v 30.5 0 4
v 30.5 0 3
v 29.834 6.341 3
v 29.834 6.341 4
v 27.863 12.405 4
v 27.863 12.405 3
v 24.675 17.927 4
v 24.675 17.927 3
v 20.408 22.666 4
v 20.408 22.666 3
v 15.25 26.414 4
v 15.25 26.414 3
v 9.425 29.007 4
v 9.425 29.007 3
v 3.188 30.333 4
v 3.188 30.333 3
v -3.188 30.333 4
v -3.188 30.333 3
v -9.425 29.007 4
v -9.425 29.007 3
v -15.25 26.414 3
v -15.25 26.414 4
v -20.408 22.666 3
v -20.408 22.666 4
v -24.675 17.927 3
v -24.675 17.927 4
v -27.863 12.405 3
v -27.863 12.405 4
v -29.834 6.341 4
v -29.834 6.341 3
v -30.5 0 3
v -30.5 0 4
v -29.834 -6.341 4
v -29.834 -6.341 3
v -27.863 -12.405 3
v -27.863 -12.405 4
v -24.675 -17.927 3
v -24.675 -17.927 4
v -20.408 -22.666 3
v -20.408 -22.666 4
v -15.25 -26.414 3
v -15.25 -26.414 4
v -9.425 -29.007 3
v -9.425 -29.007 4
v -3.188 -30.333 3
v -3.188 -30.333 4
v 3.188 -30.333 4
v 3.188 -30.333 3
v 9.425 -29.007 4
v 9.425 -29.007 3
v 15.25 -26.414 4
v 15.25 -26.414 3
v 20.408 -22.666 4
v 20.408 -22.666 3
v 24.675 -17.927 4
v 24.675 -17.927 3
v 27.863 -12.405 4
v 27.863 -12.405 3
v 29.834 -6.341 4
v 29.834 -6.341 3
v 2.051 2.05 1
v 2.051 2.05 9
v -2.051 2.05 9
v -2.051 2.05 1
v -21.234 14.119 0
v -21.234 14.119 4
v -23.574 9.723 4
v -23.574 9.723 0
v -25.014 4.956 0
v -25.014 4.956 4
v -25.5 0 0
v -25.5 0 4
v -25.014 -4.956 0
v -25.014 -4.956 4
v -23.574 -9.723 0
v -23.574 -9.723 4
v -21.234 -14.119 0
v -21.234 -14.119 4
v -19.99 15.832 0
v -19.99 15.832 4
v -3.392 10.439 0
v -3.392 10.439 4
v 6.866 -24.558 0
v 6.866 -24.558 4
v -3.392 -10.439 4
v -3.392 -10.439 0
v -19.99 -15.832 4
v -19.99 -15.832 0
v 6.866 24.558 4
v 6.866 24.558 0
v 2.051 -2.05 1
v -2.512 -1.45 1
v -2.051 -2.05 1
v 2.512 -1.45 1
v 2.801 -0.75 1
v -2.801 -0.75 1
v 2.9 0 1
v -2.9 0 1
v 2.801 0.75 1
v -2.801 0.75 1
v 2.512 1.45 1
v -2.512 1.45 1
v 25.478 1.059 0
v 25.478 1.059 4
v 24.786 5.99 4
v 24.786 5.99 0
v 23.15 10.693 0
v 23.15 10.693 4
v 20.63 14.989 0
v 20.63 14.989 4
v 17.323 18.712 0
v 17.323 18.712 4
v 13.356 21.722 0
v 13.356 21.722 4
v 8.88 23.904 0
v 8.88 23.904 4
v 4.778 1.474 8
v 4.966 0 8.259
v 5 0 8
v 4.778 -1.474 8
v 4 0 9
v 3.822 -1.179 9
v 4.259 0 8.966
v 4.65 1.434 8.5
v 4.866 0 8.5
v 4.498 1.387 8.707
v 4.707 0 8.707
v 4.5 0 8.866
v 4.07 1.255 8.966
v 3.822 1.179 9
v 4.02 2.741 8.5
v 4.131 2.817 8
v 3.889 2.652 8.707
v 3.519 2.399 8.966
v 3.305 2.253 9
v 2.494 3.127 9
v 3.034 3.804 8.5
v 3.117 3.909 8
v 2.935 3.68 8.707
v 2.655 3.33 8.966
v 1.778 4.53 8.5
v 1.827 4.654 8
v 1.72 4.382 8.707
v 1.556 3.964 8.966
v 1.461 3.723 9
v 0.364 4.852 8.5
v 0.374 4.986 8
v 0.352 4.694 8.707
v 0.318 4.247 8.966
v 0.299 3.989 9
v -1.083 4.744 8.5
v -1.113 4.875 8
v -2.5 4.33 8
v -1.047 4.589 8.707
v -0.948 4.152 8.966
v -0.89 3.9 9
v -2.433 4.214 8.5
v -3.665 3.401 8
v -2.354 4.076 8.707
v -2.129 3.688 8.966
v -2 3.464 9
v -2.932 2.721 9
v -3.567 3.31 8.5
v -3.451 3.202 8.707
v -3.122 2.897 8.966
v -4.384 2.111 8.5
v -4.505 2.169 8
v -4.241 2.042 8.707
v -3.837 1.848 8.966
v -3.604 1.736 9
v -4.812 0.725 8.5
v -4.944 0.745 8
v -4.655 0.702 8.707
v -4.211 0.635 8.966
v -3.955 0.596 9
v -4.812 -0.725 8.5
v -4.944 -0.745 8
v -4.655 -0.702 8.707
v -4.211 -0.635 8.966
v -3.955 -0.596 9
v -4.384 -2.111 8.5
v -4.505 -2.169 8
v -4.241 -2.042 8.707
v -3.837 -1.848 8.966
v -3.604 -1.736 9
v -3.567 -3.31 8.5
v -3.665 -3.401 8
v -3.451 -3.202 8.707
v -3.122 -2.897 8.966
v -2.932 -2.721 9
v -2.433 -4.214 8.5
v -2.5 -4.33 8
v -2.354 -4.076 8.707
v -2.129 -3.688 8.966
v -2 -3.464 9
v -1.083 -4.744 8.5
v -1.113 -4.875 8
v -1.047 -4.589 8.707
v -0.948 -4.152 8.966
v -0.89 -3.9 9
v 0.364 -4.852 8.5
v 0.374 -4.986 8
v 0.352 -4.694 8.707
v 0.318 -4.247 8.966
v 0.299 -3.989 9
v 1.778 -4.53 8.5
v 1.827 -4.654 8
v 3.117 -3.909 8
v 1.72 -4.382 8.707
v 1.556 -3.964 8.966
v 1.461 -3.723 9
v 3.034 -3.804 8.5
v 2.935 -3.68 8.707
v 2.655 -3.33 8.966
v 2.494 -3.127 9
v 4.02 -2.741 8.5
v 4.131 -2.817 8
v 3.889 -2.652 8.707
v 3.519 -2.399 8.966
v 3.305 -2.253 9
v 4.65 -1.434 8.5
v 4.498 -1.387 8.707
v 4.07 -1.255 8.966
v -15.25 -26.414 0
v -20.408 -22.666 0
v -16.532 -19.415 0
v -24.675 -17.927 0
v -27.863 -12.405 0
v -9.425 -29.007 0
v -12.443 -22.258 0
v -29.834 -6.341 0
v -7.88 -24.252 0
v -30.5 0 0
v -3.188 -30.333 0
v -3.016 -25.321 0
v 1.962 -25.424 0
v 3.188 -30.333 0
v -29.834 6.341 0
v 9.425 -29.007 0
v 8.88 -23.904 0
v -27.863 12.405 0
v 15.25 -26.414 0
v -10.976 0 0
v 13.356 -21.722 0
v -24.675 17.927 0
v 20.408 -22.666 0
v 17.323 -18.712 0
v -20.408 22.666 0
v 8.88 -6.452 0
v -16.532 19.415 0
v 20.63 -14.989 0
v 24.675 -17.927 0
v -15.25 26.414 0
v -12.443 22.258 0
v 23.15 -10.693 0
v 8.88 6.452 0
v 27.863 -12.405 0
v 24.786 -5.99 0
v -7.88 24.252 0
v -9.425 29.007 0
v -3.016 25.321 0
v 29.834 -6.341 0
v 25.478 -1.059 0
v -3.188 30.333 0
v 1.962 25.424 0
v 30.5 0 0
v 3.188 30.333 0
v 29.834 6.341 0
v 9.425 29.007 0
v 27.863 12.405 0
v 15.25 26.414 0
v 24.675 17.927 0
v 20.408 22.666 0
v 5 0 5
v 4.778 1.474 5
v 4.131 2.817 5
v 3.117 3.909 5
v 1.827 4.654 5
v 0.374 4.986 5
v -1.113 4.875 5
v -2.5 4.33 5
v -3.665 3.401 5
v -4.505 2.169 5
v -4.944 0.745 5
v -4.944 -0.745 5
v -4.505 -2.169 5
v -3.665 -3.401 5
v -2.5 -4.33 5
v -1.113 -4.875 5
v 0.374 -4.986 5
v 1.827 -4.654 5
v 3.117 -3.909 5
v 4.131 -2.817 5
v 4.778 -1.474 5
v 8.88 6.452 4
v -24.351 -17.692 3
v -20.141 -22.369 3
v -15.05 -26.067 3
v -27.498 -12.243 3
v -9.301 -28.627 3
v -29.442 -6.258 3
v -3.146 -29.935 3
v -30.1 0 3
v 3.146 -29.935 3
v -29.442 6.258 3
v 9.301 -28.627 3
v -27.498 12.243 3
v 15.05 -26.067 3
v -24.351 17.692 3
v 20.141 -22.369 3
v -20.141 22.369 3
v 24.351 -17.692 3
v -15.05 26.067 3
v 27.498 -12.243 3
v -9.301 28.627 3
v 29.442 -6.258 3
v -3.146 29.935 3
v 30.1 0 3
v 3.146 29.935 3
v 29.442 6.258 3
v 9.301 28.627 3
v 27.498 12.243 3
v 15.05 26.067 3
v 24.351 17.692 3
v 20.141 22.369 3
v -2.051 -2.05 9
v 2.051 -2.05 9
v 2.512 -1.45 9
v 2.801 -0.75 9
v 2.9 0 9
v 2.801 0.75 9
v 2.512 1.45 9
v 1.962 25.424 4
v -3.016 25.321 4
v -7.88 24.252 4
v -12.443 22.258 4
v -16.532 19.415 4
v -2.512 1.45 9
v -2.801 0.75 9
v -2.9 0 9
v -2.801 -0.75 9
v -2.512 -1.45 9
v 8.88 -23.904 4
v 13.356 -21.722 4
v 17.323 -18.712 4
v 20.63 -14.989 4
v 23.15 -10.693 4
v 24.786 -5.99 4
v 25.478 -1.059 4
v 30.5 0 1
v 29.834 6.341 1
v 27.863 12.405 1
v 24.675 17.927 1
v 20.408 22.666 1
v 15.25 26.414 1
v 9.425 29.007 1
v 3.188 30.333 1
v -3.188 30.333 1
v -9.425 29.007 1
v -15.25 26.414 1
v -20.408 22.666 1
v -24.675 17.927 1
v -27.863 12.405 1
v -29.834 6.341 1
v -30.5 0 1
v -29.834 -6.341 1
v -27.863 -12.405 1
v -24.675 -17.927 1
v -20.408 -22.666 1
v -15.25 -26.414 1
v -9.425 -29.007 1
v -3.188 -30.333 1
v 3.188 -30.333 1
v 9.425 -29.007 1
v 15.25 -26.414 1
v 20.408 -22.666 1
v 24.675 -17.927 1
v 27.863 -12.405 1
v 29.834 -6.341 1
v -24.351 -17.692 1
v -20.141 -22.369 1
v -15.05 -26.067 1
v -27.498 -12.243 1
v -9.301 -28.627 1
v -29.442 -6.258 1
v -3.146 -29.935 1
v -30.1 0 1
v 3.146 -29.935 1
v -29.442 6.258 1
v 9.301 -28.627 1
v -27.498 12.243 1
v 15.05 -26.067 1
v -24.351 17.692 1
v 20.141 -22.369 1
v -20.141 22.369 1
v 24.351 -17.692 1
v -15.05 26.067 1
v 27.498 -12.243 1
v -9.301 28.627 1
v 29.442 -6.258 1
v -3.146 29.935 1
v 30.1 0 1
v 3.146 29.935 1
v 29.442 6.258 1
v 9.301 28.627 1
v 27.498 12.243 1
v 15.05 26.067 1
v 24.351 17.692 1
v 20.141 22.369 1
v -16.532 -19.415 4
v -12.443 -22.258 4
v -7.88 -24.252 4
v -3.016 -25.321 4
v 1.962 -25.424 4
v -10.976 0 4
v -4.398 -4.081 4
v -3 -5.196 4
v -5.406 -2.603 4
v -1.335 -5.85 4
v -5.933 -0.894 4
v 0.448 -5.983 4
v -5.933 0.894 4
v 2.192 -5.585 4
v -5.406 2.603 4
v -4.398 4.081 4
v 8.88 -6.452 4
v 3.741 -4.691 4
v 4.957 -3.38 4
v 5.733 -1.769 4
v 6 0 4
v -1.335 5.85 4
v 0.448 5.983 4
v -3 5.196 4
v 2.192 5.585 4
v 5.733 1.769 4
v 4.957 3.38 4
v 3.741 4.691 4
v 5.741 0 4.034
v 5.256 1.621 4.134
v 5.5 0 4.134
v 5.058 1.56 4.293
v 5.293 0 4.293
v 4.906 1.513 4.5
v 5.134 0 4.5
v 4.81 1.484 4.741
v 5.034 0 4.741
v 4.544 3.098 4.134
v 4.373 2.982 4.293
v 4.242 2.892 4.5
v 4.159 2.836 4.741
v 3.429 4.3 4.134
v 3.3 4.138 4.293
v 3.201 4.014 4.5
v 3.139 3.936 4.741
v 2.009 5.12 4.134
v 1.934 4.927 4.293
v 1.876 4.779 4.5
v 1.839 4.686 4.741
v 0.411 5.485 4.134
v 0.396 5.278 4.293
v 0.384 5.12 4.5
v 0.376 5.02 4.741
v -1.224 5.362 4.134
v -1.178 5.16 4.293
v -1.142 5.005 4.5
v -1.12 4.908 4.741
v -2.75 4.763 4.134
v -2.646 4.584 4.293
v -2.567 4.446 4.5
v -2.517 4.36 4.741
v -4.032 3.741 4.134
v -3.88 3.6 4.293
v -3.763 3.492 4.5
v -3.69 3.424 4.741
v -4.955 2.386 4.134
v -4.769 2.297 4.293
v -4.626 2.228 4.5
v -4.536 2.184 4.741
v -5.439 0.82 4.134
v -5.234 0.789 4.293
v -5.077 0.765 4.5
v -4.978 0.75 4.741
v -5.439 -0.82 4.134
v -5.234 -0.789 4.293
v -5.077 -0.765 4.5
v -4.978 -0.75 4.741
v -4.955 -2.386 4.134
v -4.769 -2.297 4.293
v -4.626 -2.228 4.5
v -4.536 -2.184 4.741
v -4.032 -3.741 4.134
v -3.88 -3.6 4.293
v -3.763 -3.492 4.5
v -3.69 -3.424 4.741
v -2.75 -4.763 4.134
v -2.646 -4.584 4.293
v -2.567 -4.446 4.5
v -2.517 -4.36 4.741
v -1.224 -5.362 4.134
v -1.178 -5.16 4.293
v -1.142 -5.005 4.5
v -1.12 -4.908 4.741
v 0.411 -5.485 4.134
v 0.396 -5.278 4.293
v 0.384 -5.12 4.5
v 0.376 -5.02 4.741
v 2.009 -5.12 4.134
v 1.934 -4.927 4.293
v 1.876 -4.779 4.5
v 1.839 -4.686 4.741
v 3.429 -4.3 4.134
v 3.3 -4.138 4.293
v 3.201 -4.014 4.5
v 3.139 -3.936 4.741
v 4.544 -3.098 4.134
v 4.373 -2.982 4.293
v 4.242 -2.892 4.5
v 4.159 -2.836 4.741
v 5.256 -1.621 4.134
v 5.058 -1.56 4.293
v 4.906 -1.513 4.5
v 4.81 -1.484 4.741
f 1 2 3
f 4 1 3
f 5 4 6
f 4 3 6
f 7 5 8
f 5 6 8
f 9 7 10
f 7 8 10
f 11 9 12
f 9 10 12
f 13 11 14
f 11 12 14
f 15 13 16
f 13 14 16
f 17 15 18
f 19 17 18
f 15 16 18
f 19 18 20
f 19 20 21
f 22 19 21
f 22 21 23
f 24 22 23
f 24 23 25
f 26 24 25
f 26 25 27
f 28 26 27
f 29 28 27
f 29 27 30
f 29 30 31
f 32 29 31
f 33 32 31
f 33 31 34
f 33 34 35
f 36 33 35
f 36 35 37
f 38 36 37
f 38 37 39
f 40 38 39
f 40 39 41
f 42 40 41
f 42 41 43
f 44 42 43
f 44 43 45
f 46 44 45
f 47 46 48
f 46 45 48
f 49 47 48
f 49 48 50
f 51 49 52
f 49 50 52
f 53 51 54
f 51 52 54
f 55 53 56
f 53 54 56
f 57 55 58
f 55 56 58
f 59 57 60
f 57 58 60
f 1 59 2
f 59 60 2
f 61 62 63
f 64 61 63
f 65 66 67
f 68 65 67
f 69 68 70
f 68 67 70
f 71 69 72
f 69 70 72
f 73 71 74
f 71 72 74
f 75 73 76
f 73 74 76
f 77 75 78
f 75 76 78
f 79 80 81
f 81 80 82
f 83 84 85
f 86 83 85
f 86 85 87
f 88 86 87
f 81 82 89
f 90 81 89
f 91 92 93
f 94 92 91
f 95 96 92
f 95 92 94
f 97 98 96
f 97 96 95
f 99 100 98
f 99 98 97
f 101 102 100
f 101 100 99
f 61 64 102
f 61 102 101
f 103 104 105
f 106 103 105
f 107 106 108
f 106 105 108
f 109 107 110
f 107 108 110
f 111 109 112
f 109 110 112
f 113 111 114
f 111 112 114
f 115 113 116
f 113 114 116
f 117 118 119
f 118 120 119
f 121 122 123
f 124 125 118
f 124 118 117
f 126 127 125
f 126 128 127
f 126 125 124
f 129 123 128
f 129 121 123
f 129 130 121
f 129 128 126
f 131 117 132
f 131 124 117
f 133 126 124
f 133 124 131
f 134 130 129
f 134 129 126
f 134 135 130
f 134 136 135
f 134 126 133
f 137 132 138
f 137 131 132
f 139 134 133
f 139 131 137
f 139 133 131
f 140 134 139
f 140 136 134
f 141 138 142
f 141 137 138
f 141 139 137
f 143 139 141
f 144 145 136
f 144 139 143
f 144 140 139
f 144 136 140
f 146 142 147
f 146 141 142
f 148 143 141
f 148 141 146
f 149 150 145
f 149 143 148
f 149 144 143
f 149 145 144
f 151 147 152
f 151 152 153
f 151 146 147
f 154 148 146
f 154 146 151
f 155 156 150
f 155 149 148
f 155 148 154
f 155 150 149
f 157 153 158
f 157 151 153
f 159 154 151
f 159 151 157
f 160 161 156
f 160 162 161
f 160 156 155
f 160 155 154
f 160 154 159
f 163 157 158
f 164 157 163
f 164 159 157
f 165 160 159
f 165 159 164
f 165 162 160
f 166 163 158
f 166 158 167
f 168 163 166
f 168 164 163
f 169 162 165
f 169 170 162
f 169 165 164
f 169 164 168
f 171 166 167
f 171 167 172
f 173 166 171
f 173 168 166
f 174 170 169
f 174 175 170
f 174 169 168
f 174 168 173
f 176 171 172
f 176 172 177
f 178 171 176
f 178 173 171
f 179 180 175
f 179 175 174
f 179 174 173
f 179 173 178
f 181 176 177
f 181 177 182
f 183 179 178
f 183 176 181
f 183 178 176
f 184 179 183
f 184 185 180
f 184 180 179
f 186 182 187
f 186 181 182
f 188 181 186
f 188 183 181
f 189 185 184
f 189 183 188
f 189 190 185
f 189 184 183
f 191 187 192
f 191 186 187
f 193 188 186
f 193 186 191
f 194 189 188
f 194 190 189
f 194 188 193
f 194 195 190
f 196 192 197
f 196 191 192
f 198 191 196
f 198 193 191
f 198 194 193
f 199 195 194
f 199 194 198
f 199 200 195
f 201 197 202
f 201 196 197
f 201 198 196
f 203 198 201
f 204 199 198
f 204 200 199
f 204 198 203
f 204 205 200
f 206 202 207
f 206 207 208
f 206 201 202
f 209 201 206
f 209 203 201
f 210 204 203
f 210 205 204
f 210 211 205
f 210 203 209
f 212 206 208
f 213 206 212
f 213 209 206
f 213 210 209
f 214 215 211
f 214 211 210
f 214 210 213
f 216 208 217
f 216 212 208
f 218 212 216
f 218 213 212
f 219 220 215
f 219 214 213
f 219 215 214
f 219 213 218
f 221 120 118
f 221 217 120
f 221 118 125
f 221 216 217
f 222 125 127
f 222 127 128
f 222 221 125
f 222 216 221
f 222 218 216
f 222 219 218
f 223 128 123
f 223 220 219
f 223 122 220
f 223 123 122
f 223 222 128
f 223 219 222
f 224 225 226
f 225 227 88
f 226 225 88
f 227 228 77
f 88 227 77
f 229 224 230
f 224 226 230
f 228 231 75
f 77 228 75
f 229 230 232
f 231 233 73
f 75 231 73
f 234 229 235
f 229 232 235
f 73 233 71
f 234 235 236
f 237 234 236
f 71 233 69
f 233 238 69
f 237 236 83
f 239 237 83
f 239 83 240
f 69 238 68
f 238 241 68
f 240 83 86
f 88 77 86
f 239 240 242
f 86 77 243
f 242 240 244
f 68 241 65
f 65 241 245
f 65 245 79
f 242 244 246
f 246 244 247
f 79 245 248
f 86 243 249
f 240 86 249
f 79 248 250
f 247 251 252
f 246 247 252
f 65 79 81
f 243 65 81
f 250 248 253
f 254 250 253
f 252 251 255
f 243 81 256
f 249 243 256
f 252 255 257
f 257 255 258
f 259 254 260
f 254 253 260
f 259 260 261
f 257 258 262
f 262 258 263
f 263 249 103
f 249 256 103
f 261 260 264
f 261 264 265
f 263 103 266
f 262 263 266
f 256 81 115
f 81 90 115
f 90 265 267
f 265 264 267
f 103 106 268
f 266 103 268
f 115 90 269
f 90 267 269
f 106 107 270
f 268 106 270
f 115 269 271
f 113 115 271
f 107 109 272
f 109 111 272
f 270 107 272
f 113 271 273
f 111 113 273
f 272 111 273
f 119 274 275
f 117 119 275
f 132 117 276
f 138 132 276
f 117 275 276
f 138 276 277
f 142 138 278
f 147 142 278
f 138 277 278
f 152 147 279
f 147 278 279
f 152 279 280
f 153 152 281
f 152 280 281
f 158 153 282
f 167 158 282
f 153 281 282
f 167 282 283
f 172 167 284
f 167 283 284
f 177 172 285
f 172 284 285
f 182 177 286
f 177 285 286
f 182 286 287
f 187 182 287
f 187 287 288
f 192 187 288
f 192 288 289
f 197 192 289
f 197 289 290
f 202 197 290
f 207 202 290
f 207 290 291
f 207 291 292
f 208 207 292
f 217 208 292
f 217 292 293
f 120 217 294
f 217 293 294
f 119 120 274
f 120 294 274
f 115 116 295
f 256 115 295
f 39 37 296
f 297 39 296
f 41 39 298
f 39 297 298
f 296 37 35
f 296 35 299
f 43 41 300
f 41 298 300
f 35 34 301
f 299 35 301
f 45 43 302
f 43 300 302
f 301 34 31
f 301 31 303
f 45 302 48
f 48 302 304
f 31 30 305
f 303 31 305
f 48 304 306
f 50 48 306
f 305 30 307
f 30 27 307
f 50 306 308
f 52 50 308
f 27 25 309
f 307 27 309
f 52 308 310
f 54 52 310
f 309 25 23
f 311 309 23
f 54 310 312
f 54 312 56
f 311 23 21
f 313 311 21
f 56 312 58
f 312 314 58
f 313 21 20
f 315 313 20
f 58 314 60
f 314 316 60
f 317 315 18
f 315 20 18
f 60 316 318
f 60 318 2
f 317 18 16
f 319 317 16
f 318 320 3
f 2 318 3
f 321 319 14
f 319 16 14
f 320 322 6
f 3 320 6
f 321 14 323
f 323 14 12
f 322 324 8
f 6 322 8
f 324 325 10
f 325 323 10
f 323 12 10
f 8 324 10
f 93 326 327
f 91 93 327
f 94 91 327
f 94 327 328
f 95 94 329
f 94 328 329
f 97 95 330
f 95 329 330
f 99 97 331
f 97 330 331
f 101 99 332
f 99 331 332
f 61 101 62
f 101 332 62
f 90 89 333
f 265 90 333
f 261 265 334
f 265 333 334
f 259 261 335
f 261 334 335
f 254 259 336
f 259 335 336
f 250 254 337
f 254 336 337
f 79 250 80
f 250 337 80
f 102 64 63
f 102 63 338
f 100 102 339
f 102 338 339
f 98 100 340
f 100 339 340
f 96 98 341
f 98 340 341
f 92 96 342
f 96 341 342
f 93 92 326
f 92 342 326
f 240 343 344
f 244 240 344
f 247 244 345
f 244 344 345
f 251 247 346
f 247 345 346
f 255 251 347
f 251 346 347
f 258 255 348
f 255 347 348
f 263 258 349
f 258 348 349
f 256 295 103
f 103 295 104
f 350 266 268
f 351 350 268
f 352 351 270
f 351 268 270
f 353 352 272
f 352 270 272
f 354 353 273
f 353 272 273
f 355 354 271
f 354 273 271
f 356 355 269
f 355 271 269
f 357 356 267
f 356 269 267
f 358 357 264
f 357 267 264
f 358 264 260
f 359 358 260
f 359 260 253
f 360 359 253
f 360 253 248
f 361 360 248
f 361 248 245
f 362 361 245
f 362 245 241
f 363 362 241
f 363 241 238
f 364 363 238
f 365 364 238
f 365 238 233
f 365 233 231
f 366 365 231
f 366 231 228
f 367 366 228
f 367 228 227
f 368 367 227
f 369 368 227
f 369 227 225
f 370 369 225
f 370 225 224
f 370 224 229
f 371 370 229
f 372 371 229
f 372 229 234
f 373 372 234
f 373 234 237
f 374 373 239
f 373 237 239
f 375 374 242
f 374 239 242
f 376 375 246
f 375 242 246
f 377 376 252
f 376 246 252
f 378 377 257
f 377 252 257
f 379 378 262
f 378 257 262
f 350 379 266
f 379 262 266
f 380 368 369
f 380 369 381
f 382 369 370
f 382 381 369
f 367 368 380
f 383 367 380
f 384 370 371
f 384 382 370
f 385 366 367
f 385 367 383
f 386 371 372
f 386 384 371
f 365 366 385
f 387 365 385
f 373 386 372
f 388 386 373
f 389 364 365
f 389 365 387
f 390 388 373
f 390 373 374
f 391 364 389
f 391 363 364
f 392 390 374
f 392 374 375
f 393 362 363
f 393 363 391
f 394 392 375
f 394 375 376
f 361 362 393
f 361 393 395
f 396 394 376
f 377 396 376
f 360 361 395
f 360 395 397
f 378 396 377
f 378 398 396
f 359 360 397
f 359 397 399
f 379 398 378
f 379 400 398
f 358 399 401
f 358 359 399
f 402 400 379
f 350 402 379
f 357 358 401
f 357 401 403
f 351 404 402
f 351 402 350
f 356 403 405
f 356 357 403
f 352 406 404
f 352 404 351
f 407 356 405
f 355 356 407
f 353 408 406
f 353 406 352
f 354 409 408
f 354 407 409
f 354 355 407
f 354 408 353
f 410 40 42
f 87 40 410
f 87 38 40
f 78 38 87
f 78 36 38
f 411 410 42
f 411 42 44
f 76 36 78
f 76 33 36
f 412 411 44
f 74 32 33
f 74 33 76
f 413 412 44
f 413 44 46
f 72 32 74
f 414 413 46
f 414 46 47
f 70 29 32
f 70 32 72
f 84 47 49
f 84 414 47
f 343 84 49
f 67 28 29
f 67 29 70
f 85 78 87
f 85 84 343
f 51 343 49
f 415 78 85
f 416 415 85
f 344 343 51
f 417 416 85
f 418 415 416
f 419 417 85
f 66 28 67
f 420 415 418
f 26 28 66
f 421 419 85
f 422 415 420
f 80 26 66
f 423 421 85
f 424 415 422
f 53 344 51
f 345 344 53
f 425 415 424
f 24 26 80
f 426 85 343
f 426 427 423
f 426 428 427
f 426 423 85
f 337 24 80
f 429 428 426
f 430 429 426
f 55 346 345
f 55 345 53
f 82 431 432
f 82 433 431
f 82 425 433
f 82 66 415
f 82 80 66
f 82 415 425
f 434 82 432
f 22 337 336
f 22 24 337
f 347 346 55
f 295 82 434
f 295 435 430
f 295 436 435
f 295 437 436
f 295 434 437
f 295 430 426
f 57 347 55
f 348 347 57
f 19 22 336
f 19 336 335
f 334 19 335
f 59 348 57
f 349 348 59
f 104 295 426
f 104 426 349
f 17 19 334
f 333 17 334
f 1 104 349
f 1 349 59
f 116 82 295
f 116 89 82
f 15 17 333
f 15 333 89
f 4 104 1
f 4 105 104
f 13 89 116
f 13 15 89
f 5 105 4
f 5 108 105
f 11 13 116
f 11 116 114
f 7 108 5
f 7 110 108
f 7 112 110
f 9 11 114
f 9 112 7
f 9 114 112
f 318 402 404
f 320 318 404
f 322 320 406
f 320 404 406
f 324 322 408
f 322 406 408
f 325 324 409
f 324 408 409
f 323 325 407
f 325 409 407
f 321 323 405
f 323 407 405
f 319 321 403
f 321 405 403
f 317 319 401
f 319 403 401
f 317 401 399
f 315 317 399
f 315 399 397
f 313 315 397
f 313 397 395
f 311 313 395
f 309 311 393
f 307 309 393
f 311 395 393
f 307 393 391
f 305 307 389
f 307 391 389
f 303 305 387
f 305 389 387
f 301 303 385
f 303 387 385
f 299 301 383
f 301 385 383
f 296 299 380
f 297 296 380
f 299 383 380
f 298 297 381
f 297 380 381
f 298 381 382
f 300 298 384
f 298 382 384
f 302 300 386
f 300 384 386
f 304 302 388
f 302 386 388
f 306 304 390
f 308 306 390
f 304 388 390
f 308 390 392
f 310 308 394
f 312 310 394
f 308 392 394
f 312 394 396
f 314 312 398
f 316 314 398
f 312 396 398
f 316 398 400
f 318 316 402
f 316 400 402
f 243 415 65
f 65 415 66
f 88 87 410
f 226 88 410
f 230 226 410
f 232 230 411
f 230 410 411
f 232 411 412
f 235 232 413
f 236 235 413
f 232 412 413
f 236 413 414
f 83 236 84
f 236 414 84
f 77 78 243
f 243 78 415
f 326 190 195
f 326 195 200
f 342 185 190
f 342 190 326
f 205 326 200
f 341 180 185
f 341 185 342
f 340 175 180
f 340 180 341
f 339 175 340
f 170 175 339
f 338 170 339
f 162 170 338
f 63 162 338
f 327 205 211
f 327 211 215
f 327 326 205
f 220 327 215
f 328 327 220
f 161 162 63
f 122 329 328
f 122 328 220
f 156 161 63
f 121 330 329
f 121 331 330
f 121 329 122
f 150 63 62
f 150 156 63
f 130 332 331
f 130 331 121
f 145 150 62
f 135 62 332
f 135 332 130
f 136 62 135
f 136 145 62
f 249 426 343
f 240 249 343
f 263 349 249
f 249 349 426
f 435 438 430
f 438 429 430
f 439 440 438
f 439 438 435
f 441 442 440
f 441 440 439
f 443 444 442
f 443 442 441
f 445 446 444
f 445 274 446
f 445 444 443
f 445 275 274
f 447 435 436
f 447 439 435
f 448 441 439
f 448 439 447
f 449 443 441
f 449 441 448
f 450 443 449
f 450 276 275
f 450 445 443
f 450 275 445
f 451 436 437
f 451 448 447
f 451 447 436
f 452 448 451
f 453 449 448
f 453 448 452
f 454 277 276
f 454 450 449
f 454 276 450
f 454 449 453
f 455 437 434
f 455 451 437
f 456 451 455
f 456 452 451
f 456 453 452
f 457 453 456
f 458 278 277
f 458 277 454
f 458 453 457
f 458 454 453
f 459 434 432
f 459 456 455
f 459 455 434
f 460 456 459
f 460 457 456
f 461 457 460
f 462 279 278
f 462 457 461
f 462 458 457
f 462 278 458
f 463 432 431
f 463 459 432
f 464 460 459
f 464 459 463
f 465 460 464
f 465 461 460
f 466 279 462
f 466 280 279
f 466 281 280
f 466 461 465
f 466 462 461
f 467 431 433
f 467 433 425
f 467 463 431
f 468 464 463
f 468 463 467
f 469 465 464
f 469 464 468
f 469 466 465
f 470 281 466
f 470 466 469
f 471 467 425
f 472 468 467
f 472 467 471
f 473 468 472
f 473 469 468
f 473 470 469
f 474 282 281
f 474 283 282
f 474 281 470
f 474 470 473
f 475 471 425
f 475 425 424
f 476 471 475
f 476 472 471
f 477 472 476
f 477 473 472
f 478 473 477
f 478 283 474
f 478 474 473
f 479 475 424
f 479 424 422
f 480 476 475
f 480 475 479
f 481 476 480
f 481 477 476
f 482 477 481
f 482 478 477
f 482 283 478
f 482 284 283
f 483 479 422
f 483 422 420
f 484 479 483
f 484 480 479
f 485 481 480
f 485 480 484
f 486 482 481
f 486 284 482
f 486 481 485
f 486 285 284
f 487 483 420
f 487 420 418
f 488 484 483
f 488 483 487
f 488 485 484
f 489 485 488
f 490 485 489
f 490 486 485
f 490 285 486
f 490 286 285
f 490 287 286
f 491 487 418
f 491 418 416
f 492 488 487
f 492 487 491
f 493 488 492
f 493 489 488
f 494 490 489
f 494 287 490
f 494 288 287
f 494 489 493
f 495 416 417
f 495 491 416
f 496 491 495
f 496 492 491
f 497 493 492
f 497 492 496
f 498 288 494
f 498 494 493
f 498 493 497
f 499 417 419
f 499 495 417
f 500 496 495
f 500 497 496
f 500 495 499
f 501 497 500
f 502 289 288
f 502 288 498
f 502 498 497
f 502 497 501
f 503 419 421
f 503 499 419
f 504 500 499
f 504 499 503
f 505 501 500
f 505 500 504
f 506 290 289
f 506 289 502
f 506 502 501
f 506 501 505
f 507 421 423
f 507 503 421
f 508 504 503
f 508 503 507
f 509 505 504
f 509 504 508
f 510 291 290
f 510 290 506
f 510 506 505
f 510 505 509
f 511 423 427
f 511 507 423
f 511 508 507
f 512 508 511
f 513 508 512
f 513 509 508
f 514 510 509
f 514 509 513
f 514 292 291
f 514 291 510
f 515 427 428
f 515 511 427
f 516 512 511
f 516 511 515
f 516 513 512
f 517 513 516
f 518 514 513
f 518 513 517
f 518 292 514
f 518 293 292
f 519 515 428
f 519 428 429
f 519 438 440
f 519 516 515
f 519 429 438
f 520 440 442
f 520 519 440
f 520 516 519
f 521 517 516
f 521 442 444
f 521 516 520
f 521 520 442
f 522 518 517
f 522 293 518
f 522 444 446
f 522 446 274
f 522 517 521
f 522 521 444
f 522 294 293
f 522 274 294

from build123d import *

# Parameters (mm, degrees)
F0_R      = 30.5
F1_DEPTH  = 4
F3_R      = 30.5
F3_R_2    = 30.1
F4_DEPTH  = 2
F5_R      = 5
F6_DEPTH  = 5
F8_DEPTH  = 8
F10_DEPTH = 25
F11_R     = 1


with BuildPart() as f1:
    # F0 (on Top) → F1 (new body)
    with BuildSketch(Plane.XY):
        Circle(F0_R)
    extrude(amount=F1_DEPTH)

    # F3 (on offset) → F4 (cut)
    with BuildSketch(Plane.XY.offset(1)):
        Circle(F3_R)
        Circle(F3_R_2, mode=Mode.SUBTRACT)
    extrude(amount=F4_DEPTH, mode=Mode.SUBTRACT)

    # F5 (on face) → F6 (join)
    with BuildSketch(Plane.XY.offset(4)):
        Circle(F5_R)
    extrude(amount=F6_DEPTH)

    # F7 (on face) → F8 (cut, through all)
    with BuildSketch(Plane.XY.offset(9)):
        with BuildLine():
            Line((2.0512191497, 2.05), (-2.0512191497, 2.05))
            ThreePointArc((-2.0512191497, 2.05), (-2.9, 0), (-2.0512191497, -2.05))
            Line((-2.0512191497, -2.05), (2.0512191497, -2.05))
            ThreePointArc((2.0512191497, -2.05), (2.9, 0), (2.0512191497, 2.05))
        make_face()
    extrude(amount=-F8_DEPTH, mode=Mode.SUBTRACT)

    # F9 (on face) → F10 (cut)
    with BuildSketch(Plane.XY.offset(4)):
        with BuildLine():
            Line((-3.3918327244, 10.4389877367), (6.8663471811, 24.5581610954))
            ThreePointArc((6.8663471811, 24.5581610954), (-7.8799333566, 24.2519411655), (-19.9899164741, 15.8320320667))
            Line((-19.9899164741, 15.8320320667), (-3.3918327244, 10.4389877367))
        make_face()
        with BuildLine():
            Line((8.8799333566, 6.4516492294), (25.4780171063, 1.0586048994))
            ThreePointArc((25.4780171063, 1.0586048994), (20.6299333566, 14.9885239335), (8.8799333566, 23.9039072869))
            Line((8.8799333566, 23.9039072869), (8.8799333566, 6.4516492294))
        make_face()
        with BuildLine():
            ThreePointArc((8.8799333566, -23.9039072869), (20.6299333566, -14.9885239335), (25.4780171063, -1.0586048994))
            Line((25.4780171063, -1.0586048994), (8.8799333566, -6.4516492294))
            Line((8.8799333566, -6.4516492294), (8.8799333566, -23.9039072869))
        make_face()
        with BuildLine():
            ThreePointArc((-19.9899164741, -15.8320320667), (-7.8799333566, -24.2519411655), (6.8663471811, -24.5581610954))
            Line((6.8663471811, -24.5581610954), (-3.3918327244, -10.4389877367))
            Line((-3.3918327244, -10.4389877367), (-19.9899164741, -15.8320320667))
        make_face()
        with BuildLine():
            Line((-10.9762012644, 0), (-21.2343811698, 14.1191733588))
            ThreePointArc((-21.2343811698, 14.1191733588), (-25.5, 0), (-21.2343811698, -14.1191733588))
            Line((-21.2343811698, -14.1191733588), (-10.9762012644, 0))
        make_face()
    extrude(amount=-F10_DEPTH, mode=Mode.SUBTRACT)

    # F11
    f11_edges = [f1.edges().sort_by_distance(p)[0] for p in [
        (-5, 0, 9),
        (-5, 0, 4),
    ]]
    fillet(f11_edges, radius=F11_R)


solid = f1.part
